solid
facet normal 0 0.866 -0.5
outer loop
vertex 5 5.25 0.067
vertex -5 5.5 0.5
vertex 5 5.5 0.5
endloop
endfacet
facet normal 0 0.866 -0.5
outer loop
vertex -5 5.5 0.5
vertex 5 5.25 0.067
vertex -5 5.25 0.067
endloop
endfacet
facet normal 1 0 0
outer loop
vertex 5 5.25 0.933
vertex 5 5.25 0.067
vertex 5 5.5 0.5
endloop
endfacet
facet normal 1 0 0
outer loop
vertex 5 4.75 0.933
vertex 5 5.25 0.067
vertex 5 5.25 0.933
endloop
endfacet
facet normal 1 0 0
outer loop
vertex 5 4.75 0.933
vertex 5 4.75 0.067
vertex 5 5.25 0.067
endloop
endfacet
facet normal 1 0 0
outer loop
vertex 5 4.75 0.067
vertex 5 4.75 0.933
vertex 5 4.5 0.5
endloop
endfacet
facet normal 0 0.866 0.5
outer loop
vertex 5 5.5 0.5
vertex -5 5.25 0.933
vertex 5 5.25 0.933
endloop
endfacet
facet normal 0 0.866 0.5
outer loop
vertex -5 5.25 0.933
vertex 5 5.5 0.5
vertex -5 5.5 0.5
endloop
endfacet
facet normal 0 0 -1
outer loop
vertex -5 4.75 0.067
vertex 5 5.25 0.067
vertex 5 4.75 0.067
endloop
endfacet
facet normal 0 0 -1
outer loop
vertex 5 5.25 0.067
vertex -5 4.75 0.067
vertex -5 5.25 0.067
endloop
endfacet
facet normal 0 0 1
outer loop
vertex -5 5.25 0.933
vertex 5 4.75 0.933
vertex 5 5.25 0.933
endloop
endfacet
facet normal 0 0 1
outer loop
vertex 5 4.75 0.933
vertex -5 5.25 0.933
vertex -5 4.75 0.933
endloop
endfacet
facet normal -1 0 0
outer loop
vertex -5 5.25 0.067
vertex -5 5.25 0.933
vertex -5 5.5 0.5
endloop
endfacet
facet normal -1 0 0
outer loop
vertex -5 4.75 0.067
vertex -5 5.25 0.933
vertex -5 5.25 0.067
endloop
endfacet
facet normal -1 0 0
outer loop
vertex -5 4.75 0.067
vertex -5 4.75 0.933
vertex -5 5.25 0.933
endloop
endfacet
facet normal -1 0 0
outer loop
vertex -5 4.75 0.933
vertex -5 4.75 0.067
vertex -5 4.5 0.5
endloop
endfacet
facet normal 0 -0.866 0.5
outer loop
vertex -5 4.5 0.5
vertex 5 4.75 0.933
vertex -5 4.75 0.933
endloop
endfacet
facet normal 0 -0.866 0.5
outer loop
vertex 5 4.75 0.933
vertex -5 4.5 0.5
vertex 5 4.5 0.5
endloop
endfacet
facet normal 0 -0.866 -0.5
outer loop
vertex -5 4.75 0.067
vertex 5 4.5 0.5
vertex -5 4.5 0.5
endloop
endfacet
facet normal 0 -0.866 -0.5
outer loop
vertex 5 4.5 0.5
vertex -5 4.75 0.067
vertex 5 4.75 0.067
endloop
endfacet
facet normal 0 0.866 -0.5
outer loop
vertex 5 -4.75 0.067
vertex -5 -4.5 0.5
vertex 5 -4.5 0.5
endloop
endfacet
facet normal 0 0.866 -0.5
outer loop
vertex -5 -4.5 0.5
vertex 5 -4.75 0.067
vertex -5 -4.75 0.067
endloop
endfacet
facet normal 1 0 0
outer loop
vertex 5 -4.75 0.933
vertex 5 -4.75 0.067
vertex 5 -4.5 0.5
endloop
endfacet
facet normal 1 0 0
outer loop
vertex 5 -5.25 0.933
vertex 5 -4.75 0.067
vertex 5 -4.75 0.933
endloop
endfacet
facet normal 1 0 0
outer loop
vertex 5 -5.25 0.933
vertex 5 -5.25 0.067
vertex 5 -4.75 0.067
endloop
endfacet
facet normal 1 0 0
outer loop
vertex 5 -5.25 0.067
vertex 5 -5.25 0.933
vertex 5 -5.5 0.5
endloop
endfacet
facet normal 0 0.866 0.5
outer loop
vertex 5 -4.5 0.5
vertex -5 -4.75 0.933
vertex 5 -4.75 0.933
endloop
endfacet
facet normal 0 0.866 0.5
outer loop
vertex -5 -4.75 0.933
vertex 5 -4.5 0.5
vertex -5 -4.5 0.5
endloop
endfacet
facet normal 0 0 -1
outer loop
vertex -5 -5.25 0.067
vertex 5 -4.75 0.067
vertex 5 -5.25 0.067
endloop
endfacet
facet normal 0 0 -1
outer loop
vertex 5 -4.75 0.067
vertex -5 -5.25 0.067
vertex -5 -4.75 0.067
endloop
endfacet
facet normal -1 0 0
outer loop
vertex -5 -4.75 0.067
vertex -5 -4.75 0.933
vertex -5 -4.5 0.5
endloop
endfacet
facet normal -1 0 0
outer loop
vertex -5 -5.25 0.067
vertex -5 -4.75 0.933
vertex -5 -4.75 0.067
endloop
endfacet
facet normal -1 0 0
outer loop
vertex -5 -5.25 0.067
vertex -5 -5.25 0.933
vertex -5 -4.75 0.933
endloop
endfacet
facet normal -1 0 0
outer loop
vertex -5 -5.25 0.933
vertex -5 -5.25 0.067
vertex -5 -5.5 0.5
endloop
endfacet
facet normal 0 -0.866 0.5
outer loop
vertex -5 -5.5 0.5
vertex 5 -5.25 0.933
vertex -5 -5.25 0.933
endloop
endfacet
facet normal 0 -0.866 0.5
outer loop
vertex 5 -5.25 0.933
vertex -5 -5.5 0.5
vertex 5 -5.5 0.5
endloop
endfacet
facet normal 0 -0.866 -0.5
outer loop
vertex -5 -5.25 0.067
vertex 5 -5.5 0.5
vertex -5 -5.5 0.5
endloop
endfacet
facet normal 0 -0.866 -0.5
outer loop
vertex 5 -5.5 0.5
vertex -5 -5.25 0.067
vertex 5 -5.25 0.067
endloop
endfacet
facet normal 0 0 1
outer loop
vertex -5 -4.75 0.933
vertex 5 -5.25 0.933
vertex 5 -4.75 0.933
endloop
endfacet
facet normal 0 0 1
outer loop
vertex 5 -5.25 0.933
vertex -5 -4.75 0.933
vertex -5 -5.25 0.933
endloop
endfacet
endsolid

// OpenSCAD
// file: ledparts.scad
/**
 * Martin Egli
 * 2024-05-25
 */

// origin: center
module rgbled2427(loc_res = 32) {
    color("White")
    difference() {
        translate([-2.7/2, -2.4/2, 0])
        cube([2.7, 2.4, 1.1]);
        translate([0, 0, 1.0])
        cylinder(d = 2, h = 0.5, $fn = loc_res);
        translate([0, 2, 1])
        rotate([0, 0, -45])
        cube([4, 4, 1]);
    }
}

// origin: center
module rgbled2427_cut(cut_hi = 2) {
    translate([-2.9/2, -2.4/2, -2])
    cube([2.9, 2.4, 2.5]);
    translate([-2.7/2, -2.4/2, 0])
    cube([2.7, 2.4, cut_hi]);
}
*rgbled2427();
*rgbled2427_cut();
// main file
/**
 * Martin Egli
 * 2024-05-25
 */

use <ledparts.scad>

hex_rad = 8/2;
/* calculate hexagon center positions
 * r: radius, use "hex_rad"
 * n: index in x axis
 * m: index in y axis
 * even columns
 * dxeven = n*2*r*cos(30)
 * dyeven = m*3/2*r
 * odd columns
 * dxodd = n*3/2*r
 * dyodd = (m-1/2)*r*cos(30)
 */
dx_even_factor = 3/2*hex_rad; // see dxeven = m*3*r
dy_even_factor = 2*hex_rad*cos(30); // see dyeven = n*2*r*cos(30)
dx_odd_factor = 3/2*hex_rad; // see dxodd = m*3/2*r
dy_odd_factor = hex_rad*cos(30); // see dyodd = (2n+1)*r*cos(30)


module hexagon_element(hex_rad1 = 10/2, hex_hi1 = 1, hex_res = 6) {
    cylinder(r = hex_rad1, h = hex_hi1, $fn = hex_res);
}

module place_hexagon_element(x_pos = 0, y_pos = 0) {
    if((x_pos % 2) == 0) {
        // even column
        translate([x_pos*dx_even_factor, y_pos*dy_even_factor, 0])
        hexagon_element(hex_rad1 = hex_rad);
    }
    else {
        // odd column
        translate([x_pos*dx_odd_factor, (2*y_pos-1)*dy_odd_factor, 0])
        hexagon_element(hex_rad1 = hex_rad);
    }
}

module hexagon_edge_element(hex_rad1 = 10/2, hex_hi1 = 1, hex_res = 6) {
    //translate([-hex_rad1, -hex_rad1*cos(30), 0])
    //cube([2*hex_rad1, 2*hex_rad1*cos(30), hex_hi1]);
    translate([-hex_rad1, -hex_rad1, 0])
    cube([2*hex_rad1, 2*hex_rad1, hex_hi1]);
}

module place_hexagon_edge_element(x_pos = 0, y_pos = 0) {
    if((x_pos % 2) == 0) {
        // even column
        translate([x_pos*dx_even_factor, y_pos*dy_even_factor, 0])
        hexagon_edge_element(hex_rad1 = hex_rad);
    }
    else {
        // odd column
        translate([x_pos*dx_odd_factor, (2*y_pos-1)*dy_odd_factor, 0])
        hexagon_edge_element(hex_rad1 = hex_rad);
    }
}

module hexagon_upper_round_edge_element(hex_rad1 = 10/2, hex_hi1 = 1, hex_res = 6) {
    translate([-hex_rad1, +(hex_rad1), hex_hi1/2])
    rotate([0, 90, 0])
    rotate([0, 0, 30])    
    cylinder(d = hex_hi1, h = hex_rad1*2, $fn = hex_res);
}
hexagon_upper_round_edge_element();

module hexagon_upper_edge_element2(hex_rad1 = 10/2, hex_hi1 = 1, hex_res = 6) {
    translate([-hex_rad1, +(hex_rad1-hex_hi1), 0])
    difference() {
        translate([0, -hex_hi1, 0])
        cube([hex_rad1*2, hex_hi1*2, hex_hi1]);
        
        //#translate([-1, -3/2*hex_hi1*cos(30), -3/2*hex_hi1])
        rotate([-(30), 0, 0])
        translate([-1, 0, -3/2*hex_hi1])
        //mirror([0, 1, 0])
        cube([hex_rad1*2+2, hex_hi1*2, hex_hi1*3]);
    }
}
/*translate([-1, 0, 0])
hexagon_upper_edge_element2();*/

module place_hexagon_upper_round_edge_element(x_pos = 0, y_pos = 0) {
    if((x_pos % 2) == 0) {
        // even column
        translate([x_pos*dx_even_factor, y_pos*dy_even_factor, 0])
        //hexagon_upper_round_edge_element(hex_rad1 = hex_rad);
        hexagon_upper_edge_element2();
    }
    else {
        // odd column
        translate([x_pos*dx_odd_factor, (2*y_pos-1)*dy_odd_factor, 0])
        //hexagon_upper_round_edge_element(hex_rad1 = hex_rad);
        hexagon_upper_edge_element2();
    }
}

module hexagon_lower_round_edge_element(hex_rad1 = 10/2, hex_hi1 = 1, hex_res = 6) {
    translate([-hex_rad1, -(hex_rad1), hex_hi1/2])
    rotate([0, 90, 0])
    rotate([0, 0, 30])  
    cylinder(d = hex_hi1, h = hex_rad1*2, $fn = hex_res);
}
hexagon_lower_round_edge_element();

module hexagon_lower_edge_element2(hex_rad1 = 10/2, hex_hi1 = 1, hex_res = 6) {
    translate([-hex_rad1, -(hex_rad1-hex_hi1), 0])
    difference() {
        translate([0, -hex_hi1, 0])
        cube([hex_rad1*2, hex_hi1*2, hex_hi1]);
        
        rotate([(30), 0, 0])
        translate([-1, 0, -3/2*hex_hi1])
        mirror([0, 1, 0])
        cube([hex_rad1*2+2, hex_hi1*2, hex_hi1*3]);
    }
}

/*translate([-1, 0, 0])
hexagon_lower_edge_element2();
*/
module place_hexagon_lower_round_edge_element(x_pos = 0, y_pos = 0) {
    if((x_pos % 2) == 0) {
        // even column
        translate([x_pos*dx_even_factor, y_pos*dy_even_factor, 0])
        //hexagon_lower_round_edge_element(hex_rad1 = hex_rad);
        hexagon_lower_edge_element2();
    }
    else {
        // odd column
        translate([x_pos*dx_odd_factor, (2*y_pos-1)*dy_odd_factor, 0])
        //hexagon_lower_round_edge_element(hex_rad1 = hex_rad);
        hexagon_lower_edge_element2();
    }
}

module hexagon_cover_element(hex_rad1 = 10/2, hex_hi1 = 0.6, hex_res = 6) {
    cylinder(r = hex_rad1, h = hex_hi1, $fn = hex_res);
    cylinder(r = hex_rad1-0.8, h = hex_hi1+0.2, $fn = hex_res);
}

module place_hexagon_cover_element(x_pos = 0, y_pos = 0) {
    if((x_pos % 2) == 0) {
        // even column
        translate([x_pos*dx_even_factor, y_pos*dy_even_factor, 0])
        hexagon_cover_element(hex_rad1 = hex_rad);
    }
    else {
        // odd column
        translate([x_pos*dx_odd_factor, (2*y_pos-1)*dy_odd_factor, 0])
        hexagon_cover_element(hex_rad1 = hex_rad);
    }
}

module hexagon_cover_middle_element(hex_rad1 = 10/2, hex_hi1 = 0.6, hex_res = 6) {
    cylinder(r = hex_rad1-0.8, h = hex_hi1+0.2, $fn = hex_res);
}

module place_hexagon_cover_middle_element(x_pos = 0, y_pos = 0) {
    if((x_pos % 2) == 0) {
        // even column
        translate([x_pos*dx_even_factor, y_pos*dy_even_factor, 0])
        hexagon_cover_middle_element(hex_rad1 = hex_rad);
    }
    else {
        // odd column
        translate([x_pos*dx_odd_factor, (2*y_pos-1)*dy_odd_factor, 0])
        hexagon_cover_middle_element(hex_rad1 = hex_rad);
    }
}

module hexagon_cover_element_cut(hex_rad1 = 10/2, hex_hi1 = 20, hex_res = 6) {
    translate([0, 0, -10])
    cylinder(r = hex_rad1+0.15, h = hex_hi1, $fn = hex_res);
}

module place_hexagon_cover_element_cut(x_pos = 0, y_pos = 0) {
    if((x_pos % 2) == 0) {
        // even column
        translate([x_pos*dx_even_factor, y_pos*dy_even_factor, 0])
        hexagon_cover_element_cut(hex_rad1 = hex_rad);
    }
    else {
        // odd column
        translate([x_pos*dx_odd_factor, (2*y_pos-1)*dy_odd_factor, 0])
        hexagon_cover_element_cut(hex_rad1 = hex_rad);
    }
}

module hexagon_cover_element_led(hex_rad1 = 10/2, hex_hi1 = 0.6, col = "Red", hex_res = 6) {
    cylinder(r = hex_rad1, h = hex_hi1, $fn = hex_res);
    cylinder(r = hex_rad1-0.8, h = hex_hi1+0.2, $fn = hex_res);
    color(col)
    cylinder(r = hex_rad1-2, h = hex_hi1+0.4, $fn = hex_res);
}

module place_hexagon_cover_element_led(x_pos = 0, y_pos = 0, col = "Red") {
    if((x_pos % 2) == 0) {
        // even column
        translate([x_pos*dx_even_factor, y_pos*dy_even_factor, 0])
        hexagon_cover_element_led(hex_rad1 = hex_rad, col = col);
    }
    else {
        // odd column
        translate([x_pos*dx_odd_factor, (2*y_pos-1)*dy_odd_factor, 0])
        hexagon_cover_element_led(hex_rad1 = hex_rad, col = col);
    }
}

module hexagon_cover_element_m3_mount(hex_rad1 = 10/2, hex_hi1 = 0.6, hex_hi2 = 5, hex_res = 6, loc_res = 32) {
    cylinder(r = hex_rad1, h = hex_hi1, $fn = hex_res);
    cylinder(r = hex_rad1-0.8, h = hex_hi1+0.2, $fn = hex_res);
    translate([0, 0, -5])
    difference() {
        cylinder(r = 5/2, h = hex_hi2, $fn = loc_res);
        translate([0, 0, -1])
        cylinder(r = 2.5/2, h = hex_hi2, $fn = loc_res);
    }
}

module place_hexagon_cover_element_m3_mount(x_pos = 0, y_pos = 0) {
    if((x_pos % 2) == 0) {
        // even column
        translate([x_pos*dx_even_factor, y_pos*dy_even_factor, 0])
        hexagon_cover_element_m3_mount(hex_rad1 = hex_rad);
    }
    else {
        // odd column
        translate([x_pos*dx_odd_factor, (2*y_pos-1)*dy_odd_factor, 0])
        hexagon_cover_element_m3_mount(hex_rad1 = hex_rad);
    }
}

module m3_mount_cut(m3_dia = 3.2, hi1 = 10, loc_res = 32) {
    translate([0, 0, -10])
    cylinder(d = m3_dia, h = 15, $fn = loc_res);
}

module place_m3_mount_cut(x_pos = 0, y_pos = 0) {
    if((x_pos % 2) == 0) {
        // even column
        translate([x_pos*dx_even_factor, y_pos*dy_even_factor, 0])
        m3_mount_cut();
    }
    else {
        // odd column
        translate([x_pos*dx_odd_factor, (2*y_pos-1)*dy_odd_factor, 0])
        m3_mount_cut();
    }
}

module hexagon_cover_element_m3_mount_cut(hex_rad1 = 10/2, hex_hi1 = 10, hex_res = 6, loc_res = 32) {
    cylinder(r = hex_rad1+0.15, h = hex_hi1, $fn = hex_res);
    translate([0, 0, -10])
    cylinder(r = (5+0.3)/2, h = 10.5, $fn = loc_res);
}

module place_hexagon_cover_element_m3_mount_cut(x_pos = 0, y_pos = 0) {
    if((x_pos % 2) == 0) {
        // even column
        translate([x_pos*dx_even_factor, y_pos*dy_even_factor, 0])
        hexagon_cover_element_m3_mount_cut(hex_rad1 = hex_rad);
    }
    else {
        // odd column
        translate([x_pos*dx_odd_factor, (2*y_pos-1)*dy_odd_factor, 0])
        hexagon_cover_element_m3_mount_cut(hex_rad1 = hex_rad);
    }
}
module hexagon_spacer_element(hex_rad1 = 10/2, hex_hi = 6, wallth = 0.5, hex_res = 6) {
    difference() {
        cylinder(r = hex_rad1 + (wallth/2), h = hex_hi, $fn = hex_res);
        translate([0, 0, -1])
        cylinder(r = hex_rad1 - (wallth/2), h = hex_hi+2, $fn = hex_res);
    }
}

module hexagon_spacer_element_led2427_cut(hex_rad1 = 10/2, hex_hi = 6, wallth = 0.5, hex_res = 6) {
    difference() {
        cylinder(r = hex_rad1 + (wallth/2), h = hex_hi, $fn = hex_res);
        translate([0, 0, 0.4])
        cylinder(r = hex_rad1 - (wallth/2), h = hex_hi+2, $fn = hex_res);
        
        rgbled2427_cut();
    }
}

module place_hexagon_spacer_element(x_pos = 0, y_pos = 0) {
    if((x_pos % 2) == 0) {
        // even column
        translate([x_pos*dx_even_factor, y_pos*dy_even_factor, 0])
        hexagon_spacer_element(hex_rad1 = hex_rad);
        //hexagon_spacer_element_led2427_cut(hex_rad1 = hex_rad);
    }
    else {
        // odd column
        translate([x_pos*dx_odd_factor, (2*y_pos-1)*dy_odd_factor, 0])
        hexagon_spacer_element(hex_rad1 = hex_rad);
        //hexagon_spacer_element_led2427_cut(hex_rad1 = hex_rad);
    }
}

module hexagon_spacer_element_m3_mount(hex_rad1 = 10/2, hex_hi = 1, wallth = 0.5, hex_res = 6, loc_res = 32) {
    difference() {
        cylinder(r = hex_rad1 + (wallth/2), h = hex_hi, $fn = hex_res);
        translate([0, 0, -1])
        cylinder(r = 3.2/2, h = hex_hi+2, $fn = loc_res);
    }
}

module place_hexagon_spacer_element_m3_mount(x_pos = 0, y_pos = 0) {
    if((x_pos % 2) == 0) {
        // even column
        translate([x_pos*dx_even_factor, y_pos*dy_even_factor, 0])
        hexagon_spacer_element_m3_mount(hex_rad1 = hex_rad);
    }
    else {
        // odd column
        translate([x_pos*dx_odd_factor, (2*y_pos-1)*dy_odd_factor, 0])
        hexagon_spacer_element_m3_mount(hex_rad1 = hex_rad);
    }
}
